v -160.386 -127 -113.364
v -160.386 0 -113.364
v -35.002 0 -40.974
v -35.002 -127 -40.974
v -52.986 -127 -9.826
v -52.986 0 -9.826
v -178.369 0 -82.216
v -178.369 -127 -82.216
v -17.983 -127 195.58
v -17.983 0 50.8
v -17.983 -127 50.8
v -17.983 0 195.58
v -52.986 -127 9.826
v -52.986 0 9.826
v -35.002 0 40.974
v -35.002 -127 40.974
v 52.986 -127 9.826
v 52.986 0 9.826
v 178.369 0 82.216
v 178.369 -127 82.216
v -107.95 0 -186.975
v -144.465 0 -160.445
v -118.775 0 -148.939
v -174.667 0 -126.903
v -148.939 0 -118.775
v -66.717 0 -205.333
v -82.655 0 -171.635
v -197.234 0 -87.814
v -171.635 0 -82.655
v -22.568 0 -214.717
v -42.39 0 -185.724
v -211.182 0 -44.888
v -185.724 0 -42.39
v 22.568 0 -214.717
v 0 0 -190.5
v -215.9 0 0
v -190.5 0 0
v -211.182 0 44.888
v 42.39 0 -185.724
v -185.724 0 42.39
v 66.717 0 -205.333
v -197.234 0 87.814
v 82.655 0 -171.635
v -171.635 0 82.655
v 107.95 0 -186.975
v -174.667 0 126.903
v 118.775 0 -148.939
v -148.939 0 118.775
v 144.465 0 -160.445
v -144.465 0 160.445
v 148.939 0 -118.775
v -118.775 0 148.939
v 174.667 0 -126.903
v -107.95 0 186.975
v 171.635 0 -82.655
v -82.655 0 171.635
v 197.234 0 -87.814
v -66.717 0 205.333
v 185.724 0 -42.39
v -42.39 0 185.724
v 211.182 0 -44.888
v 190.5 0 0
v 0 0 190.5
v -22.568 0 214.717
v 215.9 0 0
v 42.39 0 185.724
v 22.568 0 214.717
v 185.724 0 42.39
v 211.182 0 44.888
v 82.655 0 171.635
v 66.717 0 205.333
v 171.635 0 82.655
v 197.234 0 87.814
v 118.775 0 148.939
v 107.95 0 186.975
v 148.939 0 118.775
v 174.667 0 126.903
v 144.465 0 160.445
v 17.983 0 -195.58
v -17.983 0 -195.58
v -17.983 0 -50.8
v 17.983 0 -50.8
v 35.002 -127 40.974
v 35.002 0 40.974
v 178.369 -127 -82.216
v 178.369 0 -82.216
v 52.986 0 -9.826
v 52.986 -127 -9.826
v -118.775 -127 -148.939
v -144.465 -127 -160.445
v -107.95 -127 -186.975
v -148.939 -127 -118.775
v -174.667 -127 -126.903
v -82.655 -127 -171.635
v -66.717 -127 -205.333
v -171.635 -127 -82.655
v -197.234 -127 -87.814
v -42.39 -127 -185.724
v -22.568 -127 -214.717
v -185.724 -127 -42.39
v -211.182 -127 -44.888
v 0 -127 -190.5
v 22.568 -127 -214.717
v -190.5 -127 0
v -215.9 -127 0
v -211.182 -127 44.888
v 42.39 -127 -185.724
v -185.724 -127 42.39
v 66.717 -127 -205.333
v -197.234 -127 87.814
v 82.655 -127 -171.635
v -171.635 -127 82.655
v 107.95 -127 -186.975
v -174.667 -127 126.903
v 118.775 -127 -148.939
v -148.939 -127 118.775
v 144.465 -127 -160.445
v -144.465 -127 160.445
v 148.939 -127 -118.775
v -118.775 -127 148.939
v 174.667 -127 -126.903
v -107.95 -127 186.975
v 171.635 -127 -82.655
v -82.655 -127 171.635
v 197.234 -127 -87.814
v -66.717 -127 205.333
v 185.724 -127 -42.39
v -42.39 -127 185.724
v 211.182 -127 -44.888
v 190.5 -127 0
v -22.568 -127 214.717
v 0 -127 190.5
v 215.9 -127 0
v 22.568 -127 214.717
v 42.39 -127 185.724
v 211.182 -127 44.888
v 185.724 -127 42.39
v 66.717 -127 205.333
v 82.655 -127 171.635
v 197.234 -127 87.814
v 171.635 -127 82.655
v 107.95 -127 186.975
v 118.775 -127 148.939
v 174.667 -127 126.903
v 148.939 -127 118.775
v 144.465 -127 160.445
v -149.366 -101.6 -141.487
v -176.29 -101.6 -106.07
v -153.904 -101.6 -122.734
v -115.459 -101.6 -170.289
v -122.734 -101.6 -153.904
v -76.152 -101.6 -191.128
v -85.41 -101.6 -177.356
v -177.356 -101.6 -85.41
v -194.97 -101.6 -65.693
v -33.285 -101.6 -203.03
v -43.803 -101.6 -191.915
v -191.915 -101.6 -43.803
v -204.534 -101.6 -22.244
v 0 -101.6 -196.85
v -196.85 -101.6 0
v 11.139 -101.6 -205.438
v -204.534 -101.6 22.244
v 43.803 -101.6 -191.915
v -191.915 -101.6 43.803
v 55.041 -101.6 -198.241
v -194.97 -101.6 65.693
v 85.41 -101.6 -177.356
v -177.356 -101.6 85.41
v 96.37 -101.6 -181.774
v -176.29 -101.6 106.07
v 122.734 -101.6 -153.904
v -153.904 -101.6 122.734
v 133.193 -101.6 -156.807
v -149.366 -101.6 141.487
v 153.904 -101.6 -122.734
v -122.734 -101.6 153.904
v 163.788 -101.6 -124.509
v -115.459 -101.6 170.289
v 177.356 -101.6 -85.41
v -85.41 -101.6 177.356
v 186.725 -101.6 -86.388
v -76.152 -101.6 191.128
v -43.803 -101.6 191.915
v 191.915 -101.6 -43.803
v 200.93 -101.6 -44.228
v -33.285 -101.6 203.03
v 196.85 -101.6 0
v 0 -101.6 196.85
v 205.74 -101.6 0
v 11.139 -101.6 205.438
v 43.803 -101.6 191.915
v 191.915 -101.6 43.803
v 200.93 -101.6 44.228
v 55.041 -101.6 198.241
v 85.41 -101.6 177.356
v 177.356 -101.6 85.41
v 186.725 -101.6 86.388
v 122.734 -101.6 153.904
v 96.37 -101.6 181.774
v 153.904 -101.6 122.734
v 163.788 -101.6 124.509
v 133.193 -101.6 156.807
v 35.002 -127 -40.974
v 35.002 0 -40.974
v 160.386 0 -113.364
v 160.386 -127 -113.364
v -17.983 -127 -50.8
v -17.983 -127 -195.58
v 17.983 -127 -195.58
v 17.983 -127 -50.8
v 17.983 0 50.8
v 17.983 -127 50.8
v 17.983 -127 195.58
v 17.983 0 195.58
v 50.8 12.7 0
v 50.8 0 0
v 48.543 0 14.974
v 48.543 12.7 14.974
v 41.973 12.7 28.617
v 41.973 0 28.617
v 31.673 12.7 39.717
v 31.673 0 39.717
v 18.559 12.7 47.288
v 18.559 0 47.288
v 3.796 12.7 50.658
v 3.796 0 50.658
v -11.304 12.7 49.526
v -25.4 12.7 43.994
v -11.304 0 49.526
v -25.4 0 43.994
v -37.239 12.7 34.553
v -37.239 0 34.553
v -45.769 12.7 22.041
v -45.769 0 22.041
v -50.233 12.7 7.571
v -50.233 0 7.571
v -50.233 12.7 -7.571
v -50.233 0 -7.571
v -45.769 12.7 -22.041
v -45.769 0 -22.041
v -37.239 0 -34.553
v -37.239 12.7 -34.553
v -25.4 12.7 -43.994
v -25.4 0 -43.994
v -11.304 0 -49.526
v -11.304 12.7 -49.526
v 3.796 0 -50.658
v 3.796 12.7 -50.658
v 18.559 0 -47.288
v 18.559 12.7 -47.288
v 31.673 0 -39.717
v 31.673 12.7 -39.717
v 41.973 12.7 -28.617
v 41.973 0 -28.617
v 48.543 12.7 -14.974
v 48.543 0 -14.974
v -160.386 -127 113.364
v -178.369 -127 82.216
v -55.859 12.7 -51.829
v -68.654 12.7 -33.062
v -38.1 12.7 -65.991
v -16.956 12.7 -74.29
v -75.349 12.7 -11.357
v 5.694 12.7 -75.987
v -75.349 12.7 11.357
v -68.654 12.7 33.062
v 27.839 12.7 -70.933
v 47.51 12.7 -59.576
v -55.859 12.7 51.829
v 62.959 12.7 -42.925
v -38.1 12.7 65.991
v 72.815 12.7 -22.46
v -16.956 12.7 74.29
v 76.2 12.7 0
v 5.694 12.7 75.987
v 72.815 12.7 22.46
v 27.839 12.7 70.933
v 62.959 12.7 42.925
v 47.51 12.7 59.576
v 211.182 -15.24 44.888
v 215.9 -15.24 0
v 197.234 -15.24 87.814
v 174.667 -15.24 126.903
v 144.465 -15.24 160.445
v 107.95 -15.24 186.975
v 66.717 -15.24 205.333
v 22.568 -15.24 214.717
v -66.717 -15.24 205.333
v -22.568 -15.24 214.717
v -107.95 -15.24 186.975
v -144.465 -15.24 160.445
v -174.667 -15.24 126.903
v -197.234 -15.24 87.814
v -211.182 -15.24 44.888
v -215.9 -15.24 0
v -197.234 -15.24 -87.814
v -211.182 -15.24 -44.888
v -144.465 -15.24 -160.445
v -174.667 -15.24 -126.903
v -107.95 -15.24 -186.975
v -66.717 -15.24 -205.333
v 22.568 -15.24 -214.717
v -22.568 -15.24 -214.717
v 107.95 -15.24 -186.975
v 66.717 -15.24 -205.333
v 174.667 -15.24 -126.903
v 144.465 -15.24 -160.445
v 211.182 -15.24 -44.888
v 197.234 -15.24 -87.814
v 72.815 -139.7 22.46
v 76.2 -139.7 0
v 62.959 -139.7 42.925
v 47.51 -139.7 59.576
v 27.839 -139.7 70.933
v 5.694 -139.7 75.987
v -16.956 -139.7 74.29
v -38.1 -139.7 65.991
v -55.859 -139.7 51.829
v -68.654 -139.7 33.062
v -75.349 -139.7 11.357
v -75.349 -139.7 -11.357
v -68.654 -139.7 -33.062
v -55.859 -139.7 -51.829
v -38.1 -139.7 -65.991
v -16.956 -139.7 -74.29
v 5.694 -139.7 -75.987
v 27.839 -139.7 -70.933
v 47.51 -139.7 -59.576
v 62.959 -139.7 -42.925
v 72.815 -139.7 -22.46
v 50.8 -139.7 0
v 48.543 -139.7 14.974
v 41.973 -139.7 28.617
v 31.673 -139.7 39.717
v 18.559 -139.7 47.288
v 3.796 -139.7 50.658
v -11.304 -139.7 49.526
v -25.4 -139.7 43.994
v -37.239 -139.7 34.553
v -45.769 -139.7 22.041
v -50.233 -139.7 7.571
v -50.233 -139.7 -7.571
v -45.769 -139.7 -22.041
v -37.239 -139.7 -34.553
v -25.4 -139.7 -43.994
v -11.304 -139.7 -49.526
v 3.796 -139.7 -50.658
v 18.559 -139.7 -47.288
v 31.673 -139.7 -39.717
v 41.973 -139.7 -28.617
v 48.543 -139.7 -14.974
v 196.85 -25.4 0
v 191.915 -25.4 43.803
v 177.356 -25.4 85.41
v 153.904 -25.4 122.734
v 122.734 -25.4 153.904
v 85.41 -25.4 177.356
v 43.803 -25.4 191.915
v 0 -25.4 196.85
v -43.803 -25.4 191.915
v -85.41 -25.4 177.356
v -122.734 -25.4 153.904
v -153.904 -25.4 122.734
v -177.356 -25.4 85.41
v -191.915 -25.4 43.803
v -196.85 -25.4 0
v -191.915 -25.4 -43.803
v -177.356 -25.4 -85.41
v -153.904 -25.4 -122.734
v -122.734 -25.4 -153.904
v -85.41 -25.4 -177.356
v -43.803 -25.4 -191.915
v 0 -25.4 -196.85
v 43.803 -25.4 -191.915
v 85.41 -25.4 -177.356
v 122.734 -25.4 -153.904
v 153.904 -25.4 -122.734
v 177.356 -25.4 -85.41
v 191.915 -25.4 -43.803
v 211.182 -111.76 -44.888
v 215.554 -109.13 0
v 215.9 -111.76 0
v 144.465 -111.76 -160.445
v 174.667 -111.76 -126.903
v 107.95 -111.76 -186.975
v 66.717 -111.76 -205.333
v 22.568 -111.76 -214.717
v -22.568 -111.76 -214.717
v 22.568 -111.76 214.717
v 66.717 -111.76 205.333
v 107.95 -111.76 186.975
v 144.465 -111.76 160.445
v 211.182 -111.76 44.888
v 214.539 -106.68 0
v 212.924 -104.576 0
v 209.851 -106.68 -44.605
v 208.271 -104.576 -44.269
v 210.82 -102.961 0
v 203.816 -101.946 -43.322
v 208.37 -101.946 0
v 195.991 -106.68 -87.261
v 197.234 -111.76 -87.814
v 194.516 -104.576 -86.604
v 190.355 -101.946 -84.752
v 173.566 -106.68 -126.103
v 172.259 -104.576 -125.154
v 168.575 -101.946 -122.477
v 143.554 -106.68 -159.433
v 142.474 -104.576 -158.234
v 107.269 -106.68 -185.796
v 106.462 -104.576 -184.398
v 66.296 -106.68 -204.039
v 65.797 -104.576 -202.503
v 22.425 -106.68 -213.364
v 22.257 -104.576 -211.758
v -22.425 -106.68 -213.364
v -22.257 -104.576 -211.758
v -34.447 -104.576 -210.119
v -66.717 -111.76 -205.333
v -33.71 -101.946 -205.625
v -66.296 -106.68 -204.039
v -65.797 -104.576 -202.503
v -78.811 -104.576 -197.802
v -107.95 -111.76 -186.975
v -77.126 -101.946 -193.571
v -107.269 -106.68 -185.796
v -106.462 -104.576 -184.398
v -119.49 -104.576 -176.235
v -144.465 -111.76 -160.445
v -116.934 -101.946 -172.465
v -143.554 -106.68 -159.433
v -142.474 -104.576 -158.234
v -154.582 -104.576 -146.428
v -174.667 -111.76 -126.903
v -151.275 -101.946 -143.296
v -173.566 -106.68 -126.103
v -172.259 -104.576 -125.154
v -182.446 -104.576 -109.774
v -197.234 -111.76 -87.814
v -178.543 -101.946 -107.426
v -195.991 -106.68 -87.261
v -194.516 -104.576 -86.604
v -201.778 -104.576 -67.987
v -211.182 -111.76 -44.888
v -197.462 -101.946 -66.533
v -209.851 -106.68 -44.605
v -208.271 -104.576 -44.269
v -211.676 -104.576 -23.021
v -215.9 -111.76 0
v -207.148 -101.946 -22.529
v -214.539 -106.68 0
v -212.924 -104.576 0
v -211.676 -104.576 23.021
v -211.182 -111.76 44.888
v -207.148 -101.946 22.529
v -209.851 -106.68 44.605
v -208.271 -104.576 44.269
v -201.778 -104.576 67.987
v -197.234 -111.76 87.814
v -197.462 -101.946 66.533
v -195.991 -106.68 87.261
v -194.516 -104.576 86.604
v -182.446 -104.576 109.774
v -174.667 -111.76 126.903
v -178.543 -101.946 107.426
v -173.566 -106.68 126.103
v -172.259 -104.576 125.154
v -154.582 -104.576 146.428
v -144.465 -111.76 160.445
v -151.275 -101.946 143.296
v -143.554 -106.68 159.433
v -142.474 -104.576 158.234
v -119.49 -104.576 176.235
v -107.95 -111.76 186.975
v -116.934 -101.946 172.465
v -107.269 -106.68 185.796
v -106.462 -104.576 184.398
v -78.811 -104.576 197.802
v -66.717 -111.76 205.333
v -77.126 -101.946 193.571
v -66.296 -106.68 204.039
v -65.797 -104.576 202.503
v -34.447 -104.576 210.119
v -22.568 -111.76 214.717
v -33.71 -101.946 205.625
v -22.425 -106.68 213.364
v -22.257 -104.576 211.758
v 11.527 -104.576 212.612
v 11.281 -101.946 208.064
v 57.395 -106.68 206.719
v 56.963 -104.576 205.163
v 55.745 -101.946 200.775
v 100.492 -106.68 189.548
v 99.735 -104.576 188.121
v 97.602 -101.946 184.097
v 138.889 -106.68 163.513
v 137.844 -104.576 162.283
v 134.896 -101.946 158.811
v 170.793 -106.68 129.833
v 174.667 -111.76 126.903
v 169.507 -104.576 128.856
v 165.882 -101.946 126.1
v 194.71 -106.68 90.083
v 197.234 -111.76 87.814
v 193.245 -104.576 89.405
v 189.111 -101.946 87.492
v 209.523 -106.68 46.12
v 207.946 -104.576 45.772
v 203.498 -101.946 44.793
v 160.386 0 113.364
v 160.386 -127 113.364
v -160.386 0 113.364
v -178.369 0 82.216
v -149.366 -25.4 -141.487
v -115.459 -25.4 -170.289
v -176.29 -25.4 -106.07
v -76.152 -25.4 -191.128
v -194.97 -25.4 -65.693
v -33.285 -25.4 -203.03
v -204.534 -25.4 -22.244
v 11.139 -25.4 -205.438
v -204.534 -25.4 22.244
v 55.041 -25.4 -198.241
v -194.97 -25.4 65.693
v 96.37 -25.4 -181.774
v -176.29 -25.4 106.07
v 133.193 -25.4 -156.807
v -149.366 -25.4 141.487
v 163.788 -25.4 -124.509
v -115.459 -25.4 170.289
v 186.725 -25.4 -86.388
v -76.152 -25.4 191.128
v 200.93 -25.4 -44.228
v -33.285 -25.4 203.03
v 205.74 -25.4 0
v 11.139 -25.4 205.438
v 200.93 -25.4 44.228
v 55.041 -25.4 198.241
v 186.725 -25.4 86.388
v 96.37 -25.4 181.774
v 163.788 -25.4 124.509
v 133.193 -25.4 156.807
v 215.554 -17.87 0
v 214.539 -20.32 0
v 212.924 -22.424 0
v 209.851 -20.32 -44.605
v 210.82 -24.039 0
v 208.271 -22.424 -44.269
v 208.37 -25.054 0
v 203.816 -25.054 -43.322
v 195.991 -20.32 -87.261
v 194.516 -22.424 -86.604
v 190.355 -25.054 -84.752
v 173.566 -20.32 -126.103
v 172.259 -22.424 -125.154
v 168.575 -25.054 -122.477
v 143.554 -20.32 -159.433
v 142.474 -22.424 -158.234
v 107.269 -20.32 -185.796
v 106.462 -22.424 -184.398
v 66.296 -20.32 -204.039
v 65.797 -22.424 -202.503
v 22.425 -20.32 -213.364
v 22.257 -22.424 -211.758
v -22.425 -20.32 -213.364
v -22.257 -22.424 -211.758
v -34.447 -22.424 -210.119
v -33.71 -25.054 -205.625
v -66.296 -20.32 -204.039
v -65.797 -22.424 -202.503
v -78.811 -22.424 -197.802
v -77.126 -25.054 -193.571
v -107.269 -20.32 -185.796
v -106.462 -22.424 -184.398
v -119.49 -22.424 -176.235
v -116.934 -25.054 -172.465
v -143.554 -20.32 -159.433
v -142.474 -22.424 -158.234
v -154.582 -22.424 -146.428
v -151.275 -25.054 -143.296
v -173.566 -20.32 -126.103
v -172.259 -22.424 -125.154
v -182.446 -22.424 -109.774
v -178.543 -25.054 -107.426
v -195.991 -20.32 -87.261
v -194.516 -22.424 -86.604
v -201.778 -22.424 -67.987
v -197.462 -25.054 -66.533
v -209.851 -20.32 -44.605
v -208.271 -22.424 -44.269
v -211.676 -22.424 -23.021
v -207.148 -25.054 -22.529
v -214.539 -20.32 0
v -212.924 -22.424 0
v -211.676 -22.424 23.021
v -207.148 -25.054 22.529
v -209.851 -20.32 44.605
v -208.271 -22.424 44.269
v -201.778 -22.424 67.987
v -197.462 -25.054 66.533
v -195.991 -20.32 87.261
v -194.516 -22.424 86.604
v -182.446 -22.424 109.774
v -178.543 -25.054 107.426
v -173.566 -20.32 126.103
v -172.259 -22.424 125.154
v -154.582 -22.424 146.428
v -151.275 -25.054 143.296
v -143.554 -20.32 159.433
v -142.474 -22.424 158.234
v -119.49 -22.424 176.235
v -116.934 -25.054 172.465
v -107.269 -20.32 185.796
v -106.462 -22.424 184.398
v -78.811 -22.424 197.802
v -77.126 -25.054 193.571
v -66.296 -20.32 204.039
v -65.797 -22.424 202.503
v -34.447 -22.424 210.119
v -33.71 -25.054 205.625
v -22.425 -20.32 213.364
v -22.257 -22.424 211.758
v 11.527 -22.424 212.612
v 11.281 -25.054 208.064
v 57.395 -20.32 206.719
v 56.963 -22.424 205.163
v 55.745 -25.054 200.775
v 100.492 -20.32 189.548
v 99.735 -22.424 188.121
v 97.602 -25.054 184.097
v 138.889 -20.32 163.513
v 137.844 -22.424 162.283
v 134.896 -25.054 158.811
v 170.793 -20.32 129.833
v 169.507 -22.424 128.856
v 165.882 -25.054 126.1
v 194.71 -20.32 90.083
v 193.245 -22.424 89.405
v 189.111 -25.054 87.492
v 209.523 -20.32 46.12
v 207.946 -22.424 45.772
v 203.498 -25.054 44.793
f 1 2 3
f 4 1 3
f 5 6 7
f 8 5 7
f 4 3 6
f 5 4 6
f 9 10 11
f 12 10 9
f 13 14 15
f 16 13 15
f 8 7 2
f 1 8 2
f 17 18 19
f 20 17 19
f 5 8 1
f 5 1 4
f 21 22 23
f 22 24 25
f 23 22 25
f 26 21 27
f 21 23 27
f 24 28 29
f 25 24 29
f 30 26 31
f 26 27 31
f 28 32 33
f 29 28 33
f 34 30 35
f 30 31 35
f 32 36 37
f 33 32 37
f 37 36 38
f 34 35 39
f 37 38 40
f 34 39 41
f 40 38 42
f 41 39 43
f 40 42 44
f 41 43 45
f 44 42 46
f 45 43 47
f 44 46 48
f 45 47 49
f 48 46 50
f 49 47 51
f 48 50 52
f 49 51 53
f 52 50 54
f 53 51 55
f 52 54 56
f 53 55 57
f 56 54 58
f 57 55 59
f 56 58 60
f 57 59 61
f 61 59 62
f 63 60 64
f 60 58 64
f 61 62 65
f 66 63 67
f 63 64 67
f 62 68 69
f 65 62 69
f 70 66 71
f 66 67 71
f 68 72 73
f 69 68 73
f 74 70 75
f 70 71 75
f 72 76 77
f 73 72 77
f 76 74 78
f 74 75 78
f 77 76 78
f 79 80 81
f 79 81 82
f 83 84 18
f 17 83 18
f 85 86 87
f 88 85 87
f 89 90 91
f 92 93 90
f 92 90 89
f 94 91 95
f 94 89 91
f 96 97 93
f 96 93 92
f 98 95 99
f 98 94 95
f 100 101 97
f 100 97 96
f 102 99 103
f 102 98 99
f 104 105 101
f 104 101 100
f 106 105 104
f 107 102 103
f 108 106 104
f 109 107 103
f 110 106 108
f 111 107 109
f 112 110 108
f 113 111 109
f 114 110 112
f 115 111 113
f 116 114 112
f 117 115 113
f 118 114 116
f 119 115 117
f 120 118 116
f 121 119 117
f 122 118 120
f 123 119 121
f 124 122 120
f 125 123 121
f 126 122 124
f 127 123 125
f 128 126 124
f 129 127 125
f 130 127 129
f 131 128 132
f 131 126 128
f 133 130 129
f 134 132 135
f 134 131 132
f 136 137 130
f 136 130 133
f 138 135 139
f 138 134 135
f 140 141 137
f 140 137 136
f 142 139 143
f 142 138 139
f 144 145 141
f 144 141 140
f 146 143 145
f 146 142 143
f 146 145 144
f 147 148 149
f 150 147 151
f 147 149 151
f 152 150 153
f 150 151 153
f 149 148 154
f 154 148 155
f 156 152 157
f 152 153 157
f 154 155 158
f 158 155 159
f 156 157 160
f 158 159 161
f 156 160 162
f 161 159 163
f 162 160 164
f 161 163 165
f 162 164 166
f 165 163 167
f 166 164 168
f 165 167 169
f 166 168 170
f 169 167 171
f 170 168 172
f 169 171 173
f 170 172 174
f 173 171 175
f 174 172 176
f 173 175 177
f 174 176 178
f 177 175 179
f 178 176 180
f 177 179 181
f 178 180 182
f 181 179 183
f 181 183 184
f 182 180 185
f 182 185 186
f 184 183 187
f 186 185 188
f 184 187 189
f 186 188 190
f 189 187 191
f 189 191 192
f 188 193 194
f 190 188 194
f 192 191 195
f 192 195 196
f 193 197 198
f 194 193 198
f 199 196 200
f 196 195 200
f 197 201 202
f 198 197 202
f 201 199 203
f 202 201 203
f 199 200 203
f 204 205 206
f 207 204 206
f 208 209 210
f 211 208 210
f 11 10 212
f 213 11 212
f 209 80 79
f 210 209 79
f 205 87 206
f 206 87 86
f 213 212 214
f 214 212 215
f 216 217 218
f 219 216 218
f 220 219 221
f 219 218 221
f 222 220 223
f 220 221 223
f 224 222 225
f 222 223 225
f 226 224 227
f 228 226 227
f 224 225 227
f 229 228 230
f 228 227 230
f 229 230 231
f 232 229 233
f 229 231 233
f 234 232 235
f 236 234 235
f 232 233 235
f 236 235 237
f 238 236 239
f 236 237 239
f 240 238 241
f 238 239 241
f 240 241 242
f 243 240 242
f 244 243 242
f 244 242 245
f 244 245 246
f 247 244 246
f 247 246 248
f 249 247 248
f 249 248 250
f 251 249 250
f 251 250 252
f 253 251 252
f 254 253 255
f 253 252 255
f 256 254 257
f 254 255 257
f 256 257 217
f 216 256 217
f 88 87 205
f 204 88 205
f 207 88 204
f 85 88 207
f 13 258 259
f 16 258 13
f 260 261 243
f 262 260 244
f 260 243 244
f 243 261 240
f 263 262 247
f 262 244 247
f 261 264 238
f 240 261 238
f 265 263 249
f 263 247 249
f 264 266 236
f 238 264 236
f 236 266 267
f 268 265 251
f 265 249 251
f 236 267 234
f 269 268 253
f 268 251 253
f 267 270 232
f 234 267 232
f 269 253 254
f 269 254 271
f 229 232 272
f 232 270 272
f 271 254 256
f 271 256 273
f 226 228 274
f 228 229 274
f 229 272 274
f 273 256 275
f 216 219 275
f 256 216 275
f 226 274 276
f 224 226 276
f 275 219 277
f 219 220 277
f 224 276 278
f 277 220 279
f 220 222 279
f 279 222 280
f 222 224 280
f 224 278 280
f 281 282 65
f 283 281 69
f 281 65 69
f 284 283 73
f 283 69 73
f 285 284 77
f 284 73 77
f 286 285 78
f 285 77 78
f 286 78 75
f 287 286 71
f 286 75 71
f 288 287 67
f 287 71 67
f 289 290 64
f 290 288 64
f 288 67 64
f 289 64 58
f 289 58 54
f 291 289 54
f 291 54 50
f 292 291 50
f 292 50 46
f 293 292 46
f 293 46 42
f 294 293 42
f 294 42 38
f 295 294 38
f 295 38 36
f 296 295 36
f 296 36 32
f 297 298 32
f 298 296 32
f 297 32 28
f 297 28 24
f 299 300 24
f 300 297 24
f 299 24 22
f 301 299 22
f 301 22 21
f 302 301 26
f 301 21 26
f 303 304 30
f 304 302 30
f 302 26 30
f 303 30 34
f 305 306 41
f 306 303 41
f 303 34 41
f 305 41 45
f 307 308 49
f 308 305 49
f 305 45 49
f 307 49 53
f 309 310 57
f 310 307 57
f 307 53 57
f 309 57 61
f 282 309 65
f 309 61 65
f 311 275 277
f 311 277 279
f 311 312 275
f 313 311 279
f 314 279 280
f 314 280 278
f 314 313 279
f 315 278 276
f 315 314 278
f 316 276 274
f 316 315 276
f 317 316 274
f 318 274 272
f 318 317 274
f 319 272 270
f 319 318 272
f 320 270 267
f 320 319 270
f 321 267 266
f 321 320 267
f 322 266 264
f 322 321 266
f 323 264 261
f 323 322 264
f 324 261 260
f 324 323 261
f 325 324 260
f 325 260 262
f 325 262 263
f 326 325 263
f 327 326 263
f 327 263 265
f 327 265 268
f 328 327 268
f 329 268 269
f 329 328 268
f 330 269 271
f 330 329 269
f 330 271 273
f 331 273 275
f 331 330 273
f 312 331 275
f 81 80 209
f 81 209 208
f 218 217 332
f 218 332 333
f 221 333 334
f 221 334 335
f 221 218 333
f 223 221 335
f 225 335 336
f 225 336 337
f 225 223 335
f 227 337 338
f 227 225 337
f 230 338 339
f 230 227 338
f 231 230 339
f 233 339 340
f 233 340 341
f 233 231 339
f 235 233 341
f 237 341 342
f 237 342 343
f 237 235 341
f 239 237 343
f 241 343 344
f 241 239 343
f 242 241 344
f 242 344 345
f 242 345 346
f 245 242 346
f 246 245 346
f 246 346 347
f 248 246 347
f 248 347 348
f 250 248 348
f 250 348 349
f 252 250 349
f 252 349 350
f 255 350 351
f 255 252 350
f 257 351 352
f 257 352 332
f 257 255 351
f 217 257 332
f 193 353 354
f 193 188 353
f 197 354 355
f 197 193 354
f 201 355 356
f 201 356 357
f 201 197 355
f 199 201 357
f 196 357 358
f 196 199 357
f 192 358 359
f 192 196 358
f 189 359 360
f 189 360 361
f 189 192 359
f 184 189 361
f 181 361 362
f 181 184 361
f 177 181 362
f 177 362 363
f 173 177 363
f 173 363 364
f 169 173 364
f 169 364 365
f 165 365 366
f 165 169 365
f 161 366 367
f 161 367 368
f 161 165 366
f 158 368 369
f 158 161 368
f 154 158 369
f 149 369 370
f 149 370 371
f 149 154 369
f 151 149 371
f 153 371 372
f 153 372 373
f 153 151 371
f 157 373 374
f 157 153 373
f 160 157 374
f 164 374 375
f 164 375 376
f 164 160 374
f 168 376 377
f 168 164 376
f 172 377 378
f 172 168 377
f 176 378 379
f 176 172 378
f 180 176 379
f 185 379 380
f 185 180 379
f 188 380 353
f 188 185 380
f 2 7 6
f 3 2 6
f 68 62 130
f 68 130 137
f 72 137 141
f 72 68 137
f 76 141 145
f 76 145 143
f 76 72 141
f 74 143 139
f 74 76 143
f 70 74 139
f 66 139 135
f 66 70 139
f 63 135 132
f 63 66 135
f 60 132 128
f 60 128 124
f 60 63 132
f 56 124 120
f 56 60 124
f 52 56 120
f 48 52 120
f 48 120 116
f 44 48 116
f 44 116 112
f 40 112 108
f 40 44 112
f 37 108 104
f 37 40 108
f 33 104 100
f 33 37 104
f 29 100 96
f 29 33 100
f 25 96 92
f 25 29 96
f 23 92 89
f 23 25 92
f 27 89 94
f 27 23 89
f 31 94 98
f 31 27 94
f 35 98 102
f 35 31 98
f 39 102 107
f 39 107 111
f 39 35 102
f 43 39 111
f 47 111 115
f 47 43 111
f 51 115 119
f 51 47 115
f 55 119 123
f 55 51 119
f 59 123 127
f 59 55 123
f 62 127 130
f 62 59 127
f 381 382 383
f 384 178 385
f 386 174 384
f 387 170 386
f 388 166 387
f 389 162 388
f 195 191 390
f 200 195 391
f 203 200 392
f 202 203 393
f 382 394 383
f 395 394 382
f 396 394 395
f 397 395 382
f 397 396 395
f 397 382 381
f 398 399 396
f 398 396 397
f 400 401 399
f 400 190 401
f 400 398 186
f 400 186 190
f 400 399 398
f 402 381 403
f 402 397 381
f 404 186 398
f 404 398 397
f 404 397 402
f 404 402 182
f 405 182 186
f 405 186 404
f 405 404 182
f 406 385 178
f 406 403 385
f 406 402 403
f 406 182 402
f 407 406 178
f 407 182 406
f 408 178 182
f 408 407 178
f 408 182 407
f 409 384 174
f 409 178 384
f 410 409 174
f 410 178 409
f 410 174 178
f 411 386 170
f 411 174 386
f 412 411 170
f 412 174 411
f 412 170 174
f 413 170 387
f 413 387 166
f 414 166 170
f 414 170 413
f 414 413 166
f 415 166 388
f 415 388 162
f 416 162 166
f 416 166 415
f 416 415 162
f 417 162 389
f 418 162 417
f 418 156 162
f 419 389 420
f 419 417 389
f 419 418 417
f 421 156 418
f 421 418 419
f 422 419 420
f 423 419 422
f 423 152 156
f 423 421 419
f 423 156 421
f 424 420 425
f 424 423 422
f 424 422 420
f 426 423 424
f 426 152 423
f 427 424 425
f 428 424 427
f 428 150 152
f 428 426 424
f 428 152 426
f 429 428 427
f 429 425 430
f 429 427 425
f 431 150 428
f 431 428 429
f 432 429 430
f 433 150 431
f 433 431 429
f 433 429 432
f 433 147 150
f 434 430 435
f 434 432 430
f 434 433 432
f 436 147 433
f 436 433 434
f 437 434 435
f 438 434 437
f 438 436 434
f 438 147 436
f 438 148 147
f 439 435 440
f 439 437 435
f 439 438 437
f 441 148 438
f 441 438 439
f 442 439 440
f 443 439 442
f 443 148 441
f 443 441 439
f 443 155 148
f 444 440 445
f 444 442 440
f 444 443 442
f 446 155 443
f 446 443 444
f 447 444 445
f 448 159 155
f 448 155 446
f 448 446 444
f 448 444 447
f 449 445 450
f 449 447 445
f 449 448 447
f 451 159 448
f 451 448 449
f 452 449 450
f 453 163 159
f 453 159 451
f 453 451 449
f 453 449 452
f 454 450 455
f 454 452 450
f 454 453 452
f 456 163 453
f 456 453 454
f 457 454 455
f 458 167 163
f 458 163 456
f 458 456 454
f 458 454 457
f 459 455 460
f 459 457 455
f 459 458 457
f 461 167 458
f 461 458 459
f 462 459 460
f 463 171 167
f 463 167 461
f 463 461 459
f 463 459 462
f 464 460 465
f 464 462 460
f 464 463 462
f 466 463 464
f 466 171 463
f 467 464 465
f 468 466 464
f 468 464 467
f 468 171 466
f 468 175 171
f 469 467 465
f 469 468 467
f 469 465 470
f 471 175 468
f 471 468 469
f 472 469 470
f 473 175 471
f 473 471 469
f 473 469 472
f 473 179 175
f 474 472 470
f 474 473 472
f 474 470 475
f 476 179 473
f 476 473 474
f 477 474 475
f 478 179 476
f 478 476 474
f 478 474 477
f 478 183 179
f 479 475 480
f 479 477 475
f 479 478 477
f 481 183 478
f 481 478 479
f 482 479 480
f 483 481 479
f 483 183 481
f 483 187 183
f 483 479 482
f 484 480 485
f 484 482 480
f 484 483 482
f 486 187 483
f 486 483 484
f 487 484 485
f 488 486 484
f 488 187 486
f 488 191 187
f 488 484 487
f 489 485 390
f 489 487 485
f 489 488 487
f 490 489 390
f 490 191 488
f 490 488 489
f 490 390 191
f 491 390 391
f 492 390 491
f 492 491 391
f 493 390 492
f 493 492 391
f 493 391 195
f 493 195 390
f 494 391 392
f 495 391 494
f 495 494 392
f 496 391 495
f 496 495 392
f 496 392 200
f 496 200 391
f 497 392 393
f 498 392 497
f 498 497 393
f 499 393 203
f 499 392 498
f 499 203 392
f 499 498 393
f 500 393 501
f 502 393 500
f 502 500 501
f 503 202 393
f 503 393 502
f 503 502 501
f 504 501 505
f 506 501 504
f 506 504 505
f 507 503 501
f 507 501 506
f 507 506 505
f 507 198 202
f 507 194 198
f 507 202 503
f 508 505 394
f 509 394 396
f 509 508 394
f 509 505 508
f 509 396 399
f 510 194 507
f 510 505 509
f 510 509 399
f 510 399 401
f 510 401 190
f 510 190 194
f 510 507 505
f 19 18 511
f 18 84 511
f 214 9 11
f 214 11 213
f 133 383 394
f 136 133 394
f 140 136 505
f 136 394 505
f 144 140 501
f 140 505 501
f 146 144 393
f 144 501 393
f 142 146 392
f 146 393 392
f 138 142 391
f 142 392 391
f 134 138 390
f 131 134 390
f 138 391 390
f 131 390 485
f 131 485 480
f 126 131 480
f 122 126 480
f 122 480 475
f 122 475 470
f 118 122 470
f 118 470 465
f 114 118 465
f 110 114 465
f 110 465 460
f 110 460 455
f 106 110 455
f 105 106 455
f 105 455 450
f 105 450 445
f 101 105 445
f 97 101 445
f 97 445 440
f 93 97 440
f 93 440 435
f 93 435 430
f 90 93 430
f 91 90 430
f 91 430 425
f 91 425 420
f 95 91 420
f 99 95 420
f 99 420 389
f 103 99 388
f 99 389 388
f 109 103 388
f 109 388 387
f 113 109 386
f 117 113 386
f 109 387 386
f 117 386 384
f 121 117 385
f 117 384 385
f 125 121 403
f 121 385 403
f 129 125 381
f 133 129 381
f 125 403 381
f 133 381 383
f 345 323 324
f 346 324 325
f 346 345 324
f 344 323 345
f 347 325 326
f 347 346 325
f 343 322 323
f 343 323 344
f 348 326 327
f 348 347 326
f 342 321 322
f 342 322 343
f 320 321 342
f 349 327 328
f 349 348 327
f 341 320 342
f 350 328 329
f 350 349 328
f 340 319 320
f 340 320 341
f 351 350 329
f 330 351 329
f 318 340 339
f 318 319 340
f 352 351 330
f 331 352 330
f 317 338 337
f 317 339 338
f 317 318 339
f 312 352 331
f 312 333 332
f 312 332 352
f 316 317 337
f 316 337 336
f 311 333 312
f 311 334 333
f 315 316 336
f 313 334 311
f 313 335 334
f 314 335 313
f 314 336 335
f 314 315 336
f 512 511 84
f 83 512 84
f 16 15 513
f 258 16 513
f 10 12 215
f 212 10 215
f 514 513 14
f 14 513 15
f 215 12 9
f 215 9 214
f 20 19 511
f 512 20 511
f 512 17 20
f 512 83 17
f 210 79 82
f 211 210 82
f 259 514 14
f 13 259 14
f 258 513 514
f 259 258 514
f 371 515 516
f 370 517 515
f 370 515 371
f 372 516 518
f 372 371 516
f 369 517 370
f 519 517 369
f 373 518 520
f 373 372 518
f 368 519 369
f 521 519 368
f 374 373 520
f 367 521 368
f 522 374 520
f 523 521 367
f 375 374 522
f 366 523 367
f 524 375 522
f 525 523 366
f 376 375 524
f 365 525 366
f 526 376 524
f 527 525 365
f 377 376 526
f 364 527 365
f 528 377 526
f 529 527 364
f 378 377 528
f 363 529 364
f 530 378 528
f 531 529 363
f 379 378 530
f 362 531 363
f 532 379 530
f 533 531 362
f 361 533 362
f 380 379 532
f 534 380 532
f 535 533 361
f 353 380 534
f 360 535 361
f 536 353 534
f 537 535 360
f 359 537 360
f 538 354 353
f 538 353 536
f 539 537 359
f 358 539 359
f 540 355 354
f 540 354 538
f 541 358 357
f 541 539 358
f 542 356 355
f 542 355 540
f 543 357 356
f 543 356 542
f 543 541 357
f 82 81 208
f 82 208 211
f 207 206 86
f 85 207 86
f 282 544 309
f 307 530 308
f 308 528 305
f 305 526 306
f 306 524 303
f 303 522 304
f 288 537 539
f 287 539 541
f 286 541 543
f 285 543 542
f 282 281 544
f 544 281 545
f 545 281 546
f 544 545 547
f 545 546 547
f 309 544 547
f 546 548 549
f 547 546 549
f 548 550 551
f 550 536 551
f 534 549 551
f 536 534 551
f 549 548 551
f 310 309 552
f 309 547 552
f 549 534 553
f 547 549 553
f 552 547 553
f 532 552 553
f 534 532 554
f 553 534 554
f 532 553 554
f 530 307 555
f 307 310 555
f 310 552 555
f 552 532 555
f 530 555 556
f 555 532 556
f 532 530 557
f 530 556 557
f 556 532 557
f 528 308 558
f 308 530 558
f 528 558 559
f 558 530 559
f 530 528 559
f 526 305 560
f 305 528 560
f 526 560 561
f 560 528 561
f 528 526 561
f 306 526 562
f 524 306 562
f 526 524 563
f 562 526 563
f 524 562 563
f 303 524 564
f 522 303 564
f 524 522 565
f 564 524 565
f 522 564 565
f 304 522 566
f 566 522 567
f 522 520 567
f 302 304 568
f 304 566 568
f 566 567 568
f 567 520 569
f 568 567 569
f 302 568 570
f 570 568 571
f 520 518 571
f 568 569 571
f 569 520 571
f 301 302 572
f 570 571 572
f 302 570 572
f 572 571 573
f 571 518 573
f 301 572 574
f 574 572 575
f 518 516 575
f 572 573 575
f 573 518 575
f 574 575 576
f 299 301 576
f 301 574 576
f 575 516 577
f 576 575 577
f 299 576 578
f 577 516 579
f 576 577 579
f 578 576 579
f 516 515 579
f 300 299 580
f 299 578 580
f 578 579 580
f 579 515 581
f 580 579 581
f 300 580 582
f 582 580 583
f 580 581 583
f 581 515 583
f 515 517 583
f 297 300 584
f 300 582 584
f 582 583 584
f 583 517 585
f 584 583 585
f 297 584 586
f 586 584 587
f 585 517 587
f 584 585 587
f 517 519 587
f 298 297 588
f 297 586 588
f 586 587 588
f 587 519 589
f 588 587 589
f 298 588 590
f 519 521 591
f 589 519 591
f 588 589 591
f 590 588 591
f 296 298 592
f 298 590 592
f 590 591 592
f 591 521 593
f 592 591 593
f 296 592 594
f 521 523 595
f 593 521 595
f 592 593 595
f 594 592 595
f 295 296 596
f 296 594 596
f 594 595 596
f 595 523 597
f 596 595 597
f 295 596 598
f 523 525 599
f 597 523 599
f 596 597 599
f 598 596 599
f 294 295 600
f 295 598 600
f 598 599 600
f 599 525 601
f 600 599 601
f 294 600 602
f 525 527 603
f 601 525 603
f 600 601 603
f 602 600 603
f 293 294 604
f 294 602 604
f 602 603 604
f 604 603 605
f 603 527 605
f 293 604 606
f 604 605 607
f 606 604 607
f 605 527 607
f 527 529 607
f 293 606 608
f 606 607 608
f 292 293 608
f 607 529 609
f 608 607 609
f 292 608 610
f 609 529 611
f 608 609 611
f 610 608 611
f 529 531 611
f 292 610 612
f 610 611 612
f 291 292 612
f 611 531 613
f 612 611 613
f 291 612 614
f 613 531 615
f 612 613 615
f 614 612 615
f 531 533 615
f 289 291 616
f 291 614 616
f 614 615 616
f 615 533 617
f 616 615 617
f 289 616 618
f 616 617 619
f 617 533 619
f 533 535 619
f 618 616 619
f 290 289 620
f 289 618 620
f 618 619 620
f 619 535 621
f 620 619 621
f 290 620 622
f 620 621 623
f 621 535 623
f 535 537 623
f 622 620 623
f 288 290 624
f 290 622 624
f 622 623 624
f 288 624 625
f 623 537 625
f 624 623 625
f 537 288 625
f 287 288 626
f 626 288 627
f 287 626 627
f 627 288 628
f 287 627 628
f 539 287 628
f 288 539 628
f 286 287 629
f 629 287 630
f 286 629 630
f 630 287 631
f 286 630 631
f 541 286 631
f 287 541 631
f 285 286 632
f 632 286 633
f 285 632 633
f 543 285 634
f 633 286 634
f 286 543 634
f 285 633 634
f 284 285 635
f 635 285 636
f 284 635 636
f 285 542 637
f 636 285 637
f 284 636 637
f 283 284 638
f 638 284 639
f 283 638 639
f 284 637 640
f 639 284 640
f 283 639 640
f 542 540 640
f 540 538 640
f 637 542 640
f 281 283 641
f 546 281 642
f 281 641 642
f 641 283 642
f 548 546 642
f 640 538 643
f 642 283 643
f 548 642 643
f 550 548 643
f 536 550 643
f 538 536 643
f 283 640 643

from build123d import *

# Parameters (mm, degrees)
F0_R      = 215.9
F0_R_2    = 190.5
F1_DEPTH  = 127
F2_R      = 76.2
F2_R_2    = 50.8
F3_DEPTH  = 139.7
F4_DEPTH  = 12.7
F5_W      = 35.9664
F5_H      = 144.78
F6_DEPTH  = 127
F8_R      = 227.2009340042
F8_R_2    = 196.85
F9_DEPTH  = 38.1
F10_R     = 223.6574457884
F10_R_2   = 196.85
F11_DEPTH = 38.1
F12_R     = 10.16


with BuildPart() as f1:
    # F0 (on Front) → F1 (new body)
    with BuildSketch(Plane.XZ):
        Circle(F0_R)
        Circle(F0_R_2, mode=Mode.SUBTRACT)
    extrude(amount=F1_DEPTH)

    # F8 (on offset) → F9 (cut)
    with BuildSketch(Plane.XZ.offset(63.5)):
        Circle(F8_R)
        Circle(F8_R_2, mode=Mode.SUBTRACT)
    extrude(amount=F9_DEPTH, mode=Mode.SUBTRACT)

    # F10 (on offset) → F11 (cut)
    with BuildSketch(Plane.XZ.offset(63.5)):
        Circle(F10_R)
        Circle(F10_R_2, mode=Mode.SUBTRACT)
    extrude(amount=-F11_DEPTH, mode=Mode.SUBTRACT)

    # F12
    f12_edges = [f1.edges().sort_by_distance(p)[0] for p in [
        (-215.9, -101.6, 0),
        (-215.9, -25.4, 0),
    ]]
    fillet(f12_edges, radius=F12_R)


with BuildPart() as f3:
    # F2 (on Front) → F3 (new body)
    with BuildSketch(Plane.XZ):
        Circle(F2_R)
        Circle(F2_R_2, mode=Mode.SUBTRACT)
    extrude(amount=F3_DEPTH)

    # F4 (add): a face of the model
    f4_faces = [f3.faces().sort_by_distance(p)[0] for p in [
        (-74.0447385309, 0, 0),
    ]]
    extrude(f4_faces, amount=F4_DEPTH)


with BuildPart() as f6:
    # F5 (on Front) → F6 (new body)
    with BuildSketch(Plane.XZ):
        with Locations((0, 123.19)):
            Rectangle(F5_W, F5_H)
    extrude(amount=F6_DEPTH)


with BuildPart() as f6b:
    # F5 (on Front) → F6, piece 2 (new body)
    with BuildSketch(Plane.XZ):
        Polygon((-35.0024905122, 40.9739080413), (-160.3856484722, 113.3639080413), (-178.3688484722, 82.2160919587), (-52.9856905122, 9.8260919587), align=None)
    extrude(amount=F6_DEPTH)


with BuildPart() as f6c:
    # F5 (on Front) → F6, piece 3 (new body)
    with BuildSketch(Plane.XZ):
        Polygon((-52.9856905122, -9.8260919587), (-178.3688484722, -82.2160919587), (-160.3856484722, -113.3639080413), (-35.0024905122, -40.9739080413), align=None)
    extrude(amount=F6_DEPTH)


with BuildPart() as f6d:
    # F5 (on Front) → F6, piece 4 (new body)
    with BuildSketch(Plane.XZ):
        with Locations((0, -123.19)):
            Rectangle(F5_W, F5_H)
    extrude(amount=F6_DEPTH)


with BuildPart() as f6e:
    # F5 (on Front) → F6, piece 5 (new body)
    with BuildSketch(Plane.XZ):
        Polygon((35.0024905122, -40.9739080413), (160.3856484722, -113.3639080413), (178.3688484722, -82.2160919587), (52.9856905122, -9.8260919587), align=None)
    extrude(amount=F6_DEPTH)


with BuildPart() as f6f:
    # F5 (on Front) → F6, piece 6 (new body)
    with BuildSketch(Plane.XZ):
        Polygon((52.9856905122, 9.8260919587), (178.3688484722, 82.2160919587), (160.3856484722, 113.3639080413), (35.0024905122, 40.9739080413), align=None)
    extrude(amount=F6_DEPTH)


solid = Compound([f1.part, f3.part, f6.part, f6b.part, f6c.part, f6d.part, f6e.part, f6f.part])
